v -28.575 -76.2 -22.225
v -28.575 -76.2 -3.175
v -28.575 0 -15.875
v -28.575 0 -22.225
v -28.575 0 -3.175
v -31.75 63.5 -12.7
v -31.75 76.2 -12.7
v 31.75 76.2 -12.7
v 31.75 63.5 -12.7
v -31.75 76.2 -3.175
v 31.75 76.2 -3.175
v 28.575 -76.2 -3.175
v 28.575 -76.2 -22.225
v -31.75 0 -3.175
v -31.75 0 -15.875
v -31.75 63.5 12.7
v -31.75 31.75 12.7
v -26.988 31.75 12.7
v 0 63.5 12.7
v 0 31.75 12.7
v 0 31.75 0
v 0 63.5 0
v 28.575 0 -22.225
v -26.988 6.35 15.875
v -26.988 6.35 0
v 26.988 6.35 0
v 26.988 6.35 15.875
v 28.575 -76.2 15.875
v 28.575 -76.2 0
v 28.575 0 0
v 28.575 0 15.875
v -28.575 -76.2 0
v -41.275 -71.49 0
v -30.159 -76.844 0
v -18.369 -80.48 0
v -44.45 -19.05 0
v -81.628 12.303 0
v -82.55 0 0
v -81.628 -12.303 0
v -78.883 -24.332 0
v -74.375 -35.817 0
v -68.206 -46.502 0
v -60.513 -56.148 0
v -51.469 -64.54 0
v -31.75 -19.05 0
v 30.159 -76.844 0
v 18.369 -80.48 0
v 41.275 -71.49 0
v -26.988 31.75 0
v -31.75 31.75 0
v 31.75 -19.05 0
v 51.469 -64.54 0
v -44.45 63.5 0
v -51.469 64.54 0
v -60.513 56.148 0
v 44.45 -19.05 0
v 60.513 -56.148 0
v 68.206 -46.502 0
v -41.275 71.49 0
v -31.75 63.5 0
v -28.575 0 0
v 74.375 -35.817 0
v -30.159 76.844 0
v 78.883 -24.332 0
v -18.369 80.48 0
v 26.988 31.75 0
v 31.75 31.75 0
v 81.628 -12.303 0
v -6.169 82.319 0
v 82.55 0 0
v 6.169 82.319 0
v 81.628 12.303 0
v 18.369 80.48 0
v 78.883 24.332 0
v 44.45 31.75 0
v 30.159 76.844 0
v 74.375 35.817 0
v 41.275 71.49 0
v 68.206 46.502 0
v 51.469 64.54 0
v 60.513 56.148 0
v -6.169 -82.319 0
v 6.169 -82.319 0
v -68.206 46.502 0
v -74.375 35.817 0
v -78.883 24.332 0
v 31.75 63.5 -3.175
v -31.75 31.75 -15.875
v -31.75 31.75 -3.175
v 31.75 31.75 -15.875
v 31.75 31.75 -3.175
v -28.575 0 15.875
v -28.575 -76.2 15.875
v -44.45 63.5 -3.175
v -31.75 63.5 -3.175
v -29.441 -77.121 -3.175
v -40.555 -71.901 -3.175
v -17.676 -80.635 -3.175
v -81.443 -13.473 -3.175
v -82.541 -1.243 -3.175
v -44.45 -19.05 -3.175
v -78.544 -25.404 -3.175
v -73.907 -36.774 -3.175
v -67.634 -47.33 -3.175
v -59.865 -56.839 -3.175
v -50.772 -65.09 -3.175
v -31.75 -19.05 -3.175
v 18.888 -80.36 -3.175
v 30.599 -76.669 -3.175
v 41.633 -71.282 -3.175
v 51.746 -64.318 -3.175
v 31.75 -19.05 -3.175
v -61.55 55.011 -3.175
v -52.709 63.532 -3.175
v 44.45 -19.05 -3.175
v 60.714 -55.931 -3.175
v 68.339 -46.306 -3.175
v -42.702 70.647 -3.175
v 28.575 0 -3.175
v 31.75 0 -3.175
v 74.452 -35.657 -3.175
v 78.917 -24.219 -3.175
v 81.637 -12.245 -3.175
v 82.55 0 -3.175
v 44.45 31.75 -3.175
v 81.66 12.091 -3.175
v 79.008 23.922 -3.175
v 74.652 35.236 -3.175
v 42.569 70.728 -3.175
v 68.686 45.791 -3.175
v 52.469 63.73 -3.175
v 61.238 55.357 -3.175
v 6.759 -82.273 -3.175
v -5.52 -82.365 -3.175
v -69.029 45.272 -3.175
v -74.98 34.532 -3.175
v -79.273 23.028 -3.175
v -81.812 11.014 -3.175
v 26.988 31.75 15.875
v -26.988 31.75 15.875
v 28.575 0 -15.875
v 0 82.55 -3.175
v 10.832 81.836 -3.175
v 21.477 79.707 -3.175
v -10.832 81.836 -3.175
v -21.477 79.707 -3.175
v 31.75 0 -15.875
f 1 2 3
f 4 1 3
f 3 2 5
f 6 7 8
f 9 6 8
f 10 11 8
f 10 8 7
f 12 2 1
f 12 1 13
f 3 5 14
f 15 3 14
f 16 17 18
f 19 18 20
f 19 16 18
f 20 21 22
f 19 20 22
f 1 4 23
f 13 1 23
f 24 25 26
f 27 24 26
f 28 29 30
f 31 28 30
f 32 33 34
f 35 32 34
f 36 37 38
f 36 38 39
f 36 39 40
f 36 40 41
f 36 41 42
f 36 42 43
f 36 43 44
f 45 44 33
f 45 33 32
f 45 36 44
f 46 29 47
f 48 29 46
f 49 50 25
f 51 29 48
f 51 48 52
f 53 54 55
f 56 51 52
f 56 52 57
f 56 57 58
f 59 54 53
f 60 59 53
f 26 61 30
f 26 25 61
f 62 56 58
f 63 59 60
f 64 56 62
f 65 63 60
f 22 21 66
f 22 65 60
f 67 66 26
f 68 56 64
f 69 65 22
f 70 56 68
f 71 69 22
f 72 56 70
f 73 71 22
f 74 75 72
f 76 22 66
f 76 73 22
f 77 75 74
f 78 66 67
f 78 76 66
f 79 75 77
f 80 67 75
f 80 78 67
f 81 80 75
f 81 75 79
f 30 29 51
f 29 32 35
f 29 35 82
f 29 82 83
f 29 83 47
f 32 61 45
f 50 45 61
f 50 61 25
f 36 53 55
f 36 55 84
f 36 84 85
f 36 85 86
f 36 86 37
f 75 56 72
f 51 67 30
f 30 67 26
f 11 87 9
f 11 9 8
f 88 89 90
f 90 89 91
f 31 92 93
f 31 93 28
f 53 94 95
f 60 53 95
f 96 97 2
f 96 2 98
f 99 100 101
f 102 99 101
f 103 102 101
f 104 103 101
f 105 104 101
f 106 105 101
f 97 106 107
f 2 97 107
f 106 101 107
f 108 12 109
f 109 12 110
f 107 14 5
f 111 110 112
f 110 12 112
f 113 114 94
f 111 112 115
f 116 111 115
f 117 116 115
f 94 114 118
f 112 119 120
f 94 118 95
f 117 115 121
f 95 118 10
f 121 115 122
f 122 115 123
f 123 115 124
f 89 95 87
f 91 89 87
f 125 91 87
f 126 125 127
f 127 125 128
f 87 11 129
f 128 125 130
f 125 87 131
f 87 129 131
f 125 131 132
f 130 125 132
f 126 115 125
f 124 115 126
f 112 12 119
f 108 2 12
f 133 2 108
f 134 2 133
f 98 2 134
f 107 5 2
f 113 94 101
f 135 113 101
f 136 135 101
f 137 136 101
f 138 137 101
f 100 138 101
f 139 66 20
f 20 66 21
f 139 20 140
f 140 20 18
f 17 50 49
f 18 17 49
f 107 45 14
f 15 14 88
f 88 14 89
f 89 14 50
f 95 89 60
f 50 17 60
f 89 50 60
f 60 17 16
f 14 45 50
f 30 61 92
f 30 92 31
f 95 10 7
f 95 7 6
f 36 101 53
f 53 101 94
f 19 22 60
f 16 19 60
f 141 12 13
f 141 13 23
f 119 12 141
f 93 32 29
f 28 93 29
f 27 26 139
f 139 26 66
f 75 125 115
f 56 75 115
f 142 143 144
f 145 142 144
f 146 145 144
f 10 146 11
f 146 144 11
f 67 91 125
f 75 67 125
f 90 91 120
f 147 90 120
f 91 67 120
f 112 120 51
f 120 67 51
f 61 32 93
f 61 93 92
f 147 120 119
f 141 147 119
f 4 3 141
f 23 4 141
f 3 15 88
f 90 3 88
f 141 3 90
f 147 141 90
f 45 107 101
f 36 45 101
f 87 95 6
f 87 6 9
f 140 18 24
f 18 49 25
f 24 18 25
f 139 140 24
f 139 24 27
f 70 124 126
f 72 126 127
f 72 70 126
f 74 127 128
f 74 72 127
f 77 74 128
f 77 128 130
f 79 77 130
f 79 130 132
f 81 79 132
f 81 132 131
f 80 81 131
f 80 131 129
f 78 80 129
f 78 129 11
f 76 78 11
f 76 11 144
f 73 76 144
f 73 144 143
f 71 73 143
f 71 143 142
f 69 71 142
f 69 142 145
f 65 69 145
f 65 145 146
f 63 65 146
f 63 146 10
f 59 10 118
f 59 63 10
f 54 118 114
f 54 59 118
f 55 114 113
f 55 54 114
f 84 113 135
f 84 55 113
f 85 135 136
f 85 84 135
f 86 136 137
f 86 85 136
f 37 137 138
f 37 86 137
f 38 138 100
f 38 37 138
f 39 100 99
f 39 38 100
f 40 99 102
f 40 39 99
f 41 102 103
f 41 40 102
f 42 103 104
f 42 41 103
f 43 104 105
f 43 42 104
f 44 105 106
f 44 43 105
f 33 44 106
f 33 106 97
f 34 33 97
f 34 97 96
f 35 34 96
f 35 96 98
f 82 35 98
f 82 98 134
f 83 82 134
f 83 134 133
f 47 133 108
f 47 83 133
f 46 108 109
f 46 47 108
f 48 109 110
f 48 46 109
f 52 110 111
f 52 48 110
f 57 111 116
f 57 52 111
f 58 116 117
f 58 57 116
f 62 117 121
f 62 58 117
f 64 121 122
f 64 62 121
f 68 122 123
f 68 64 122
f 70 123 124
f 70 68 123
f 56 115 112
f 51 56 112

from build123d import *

# Parameters (mm, degrees)
F0_R      = 82.55
F2_DEPTH  = 3.175
F1_W      = 57.15
F1_H      = 76.2
F3_DEPTH  = 15.875
F4_DEPTH  = 22.225
F5_DEPTH  = 12.7
F6_DEPTH  = 12.7
F7_DEPTH  = 15.875
F9_DEPTH  = 12.7
F10_DEPTH = 25.4


with BuildPart() as f2:
    # F0 (on Top) → F2 (new body)
    with BuildSketch(Plane.XY):
        Circle(F0_R)
    extrude(amount=-F2_DEPTH)

    # F1 (on Top) → F3 (join)
    with BuildSketch(Plane.XY):
        with Locations((0, -38.1)):
            Rectangle(F1_W, F1_H)
    extrude(amount=F3_DEPTH)

    # F1 (on Top) → F4 (join)
    with BuildSketch(Plane.XY):
        with Locations((0, -38.1)):
            Rectangle(F1_W, F1_H)
    extrude(amount=-F4_DEPTH)

    # F1 (on Top) → F5 (join)
    with BuildSketch(Plane.XY):
        Polygon((-31.75, 76.2), (-31.75, 63.5), (0, 63.5), (31.75, 63.5), (31.75, 76.2), align=None)
    extrude(amount=-F5_DEPTH)

    # F1 (on Top) → F6 (join)
    with BuildSketch(Plane.XY):
        Polygon((0, 63.5), (-31.75, 63.5), (-31.75, 31.75), (-26.9875, 31.75), (0, 31.75), align=None)
    extrude(amount=F6_DEPTH)

    # F1 (on Top) → F7 (join)
    with BuildSketch(Plane.XY):
        Polygon((26.9875, 31.75), (0, 31.75), (-26.9875, 31.75), (-26.9875, 6.35), (26.9875, 6.35), align=None)
    extrude(amount=F7_DEPTH)

    # F8 (on face) → F9 (join)
    with BuildSketch(Plane(origin=(0, 0, -3.175), x_dir=(1, 0, 0), z_dir=(0, 0, -1))):
        Polygon((-28.575, 0), (-31.75, 0), (-31.75, -31.75), (31.75, -31.75), (31.75, 0), (28.575, 0), align=None)
    extrude(amount=F9_DEPTH)

    # F8 (on face) → F10 (cut)
    with BuildSketch(Plane(origin=(0, 0, -3.175), x_dir=(1, 0, 0), z_dir=(0, 0, -1))):
        Polygon((31.75, 0), (31.75, -31.75), (44.45, -31.75), (44.45, 19.05), (31.75, 19.05), align=None)
        Polygon((-31.75, -31.75), (-31.75, 0), (-31.75, 19.05), (-44.45, 19.05), (-44.45, -63.5), (-31.75, -63.5), align=None)
    extrude(amount=-F10_DEPTH, mode=Mode.SUBTRACT)


solid = f2.part
